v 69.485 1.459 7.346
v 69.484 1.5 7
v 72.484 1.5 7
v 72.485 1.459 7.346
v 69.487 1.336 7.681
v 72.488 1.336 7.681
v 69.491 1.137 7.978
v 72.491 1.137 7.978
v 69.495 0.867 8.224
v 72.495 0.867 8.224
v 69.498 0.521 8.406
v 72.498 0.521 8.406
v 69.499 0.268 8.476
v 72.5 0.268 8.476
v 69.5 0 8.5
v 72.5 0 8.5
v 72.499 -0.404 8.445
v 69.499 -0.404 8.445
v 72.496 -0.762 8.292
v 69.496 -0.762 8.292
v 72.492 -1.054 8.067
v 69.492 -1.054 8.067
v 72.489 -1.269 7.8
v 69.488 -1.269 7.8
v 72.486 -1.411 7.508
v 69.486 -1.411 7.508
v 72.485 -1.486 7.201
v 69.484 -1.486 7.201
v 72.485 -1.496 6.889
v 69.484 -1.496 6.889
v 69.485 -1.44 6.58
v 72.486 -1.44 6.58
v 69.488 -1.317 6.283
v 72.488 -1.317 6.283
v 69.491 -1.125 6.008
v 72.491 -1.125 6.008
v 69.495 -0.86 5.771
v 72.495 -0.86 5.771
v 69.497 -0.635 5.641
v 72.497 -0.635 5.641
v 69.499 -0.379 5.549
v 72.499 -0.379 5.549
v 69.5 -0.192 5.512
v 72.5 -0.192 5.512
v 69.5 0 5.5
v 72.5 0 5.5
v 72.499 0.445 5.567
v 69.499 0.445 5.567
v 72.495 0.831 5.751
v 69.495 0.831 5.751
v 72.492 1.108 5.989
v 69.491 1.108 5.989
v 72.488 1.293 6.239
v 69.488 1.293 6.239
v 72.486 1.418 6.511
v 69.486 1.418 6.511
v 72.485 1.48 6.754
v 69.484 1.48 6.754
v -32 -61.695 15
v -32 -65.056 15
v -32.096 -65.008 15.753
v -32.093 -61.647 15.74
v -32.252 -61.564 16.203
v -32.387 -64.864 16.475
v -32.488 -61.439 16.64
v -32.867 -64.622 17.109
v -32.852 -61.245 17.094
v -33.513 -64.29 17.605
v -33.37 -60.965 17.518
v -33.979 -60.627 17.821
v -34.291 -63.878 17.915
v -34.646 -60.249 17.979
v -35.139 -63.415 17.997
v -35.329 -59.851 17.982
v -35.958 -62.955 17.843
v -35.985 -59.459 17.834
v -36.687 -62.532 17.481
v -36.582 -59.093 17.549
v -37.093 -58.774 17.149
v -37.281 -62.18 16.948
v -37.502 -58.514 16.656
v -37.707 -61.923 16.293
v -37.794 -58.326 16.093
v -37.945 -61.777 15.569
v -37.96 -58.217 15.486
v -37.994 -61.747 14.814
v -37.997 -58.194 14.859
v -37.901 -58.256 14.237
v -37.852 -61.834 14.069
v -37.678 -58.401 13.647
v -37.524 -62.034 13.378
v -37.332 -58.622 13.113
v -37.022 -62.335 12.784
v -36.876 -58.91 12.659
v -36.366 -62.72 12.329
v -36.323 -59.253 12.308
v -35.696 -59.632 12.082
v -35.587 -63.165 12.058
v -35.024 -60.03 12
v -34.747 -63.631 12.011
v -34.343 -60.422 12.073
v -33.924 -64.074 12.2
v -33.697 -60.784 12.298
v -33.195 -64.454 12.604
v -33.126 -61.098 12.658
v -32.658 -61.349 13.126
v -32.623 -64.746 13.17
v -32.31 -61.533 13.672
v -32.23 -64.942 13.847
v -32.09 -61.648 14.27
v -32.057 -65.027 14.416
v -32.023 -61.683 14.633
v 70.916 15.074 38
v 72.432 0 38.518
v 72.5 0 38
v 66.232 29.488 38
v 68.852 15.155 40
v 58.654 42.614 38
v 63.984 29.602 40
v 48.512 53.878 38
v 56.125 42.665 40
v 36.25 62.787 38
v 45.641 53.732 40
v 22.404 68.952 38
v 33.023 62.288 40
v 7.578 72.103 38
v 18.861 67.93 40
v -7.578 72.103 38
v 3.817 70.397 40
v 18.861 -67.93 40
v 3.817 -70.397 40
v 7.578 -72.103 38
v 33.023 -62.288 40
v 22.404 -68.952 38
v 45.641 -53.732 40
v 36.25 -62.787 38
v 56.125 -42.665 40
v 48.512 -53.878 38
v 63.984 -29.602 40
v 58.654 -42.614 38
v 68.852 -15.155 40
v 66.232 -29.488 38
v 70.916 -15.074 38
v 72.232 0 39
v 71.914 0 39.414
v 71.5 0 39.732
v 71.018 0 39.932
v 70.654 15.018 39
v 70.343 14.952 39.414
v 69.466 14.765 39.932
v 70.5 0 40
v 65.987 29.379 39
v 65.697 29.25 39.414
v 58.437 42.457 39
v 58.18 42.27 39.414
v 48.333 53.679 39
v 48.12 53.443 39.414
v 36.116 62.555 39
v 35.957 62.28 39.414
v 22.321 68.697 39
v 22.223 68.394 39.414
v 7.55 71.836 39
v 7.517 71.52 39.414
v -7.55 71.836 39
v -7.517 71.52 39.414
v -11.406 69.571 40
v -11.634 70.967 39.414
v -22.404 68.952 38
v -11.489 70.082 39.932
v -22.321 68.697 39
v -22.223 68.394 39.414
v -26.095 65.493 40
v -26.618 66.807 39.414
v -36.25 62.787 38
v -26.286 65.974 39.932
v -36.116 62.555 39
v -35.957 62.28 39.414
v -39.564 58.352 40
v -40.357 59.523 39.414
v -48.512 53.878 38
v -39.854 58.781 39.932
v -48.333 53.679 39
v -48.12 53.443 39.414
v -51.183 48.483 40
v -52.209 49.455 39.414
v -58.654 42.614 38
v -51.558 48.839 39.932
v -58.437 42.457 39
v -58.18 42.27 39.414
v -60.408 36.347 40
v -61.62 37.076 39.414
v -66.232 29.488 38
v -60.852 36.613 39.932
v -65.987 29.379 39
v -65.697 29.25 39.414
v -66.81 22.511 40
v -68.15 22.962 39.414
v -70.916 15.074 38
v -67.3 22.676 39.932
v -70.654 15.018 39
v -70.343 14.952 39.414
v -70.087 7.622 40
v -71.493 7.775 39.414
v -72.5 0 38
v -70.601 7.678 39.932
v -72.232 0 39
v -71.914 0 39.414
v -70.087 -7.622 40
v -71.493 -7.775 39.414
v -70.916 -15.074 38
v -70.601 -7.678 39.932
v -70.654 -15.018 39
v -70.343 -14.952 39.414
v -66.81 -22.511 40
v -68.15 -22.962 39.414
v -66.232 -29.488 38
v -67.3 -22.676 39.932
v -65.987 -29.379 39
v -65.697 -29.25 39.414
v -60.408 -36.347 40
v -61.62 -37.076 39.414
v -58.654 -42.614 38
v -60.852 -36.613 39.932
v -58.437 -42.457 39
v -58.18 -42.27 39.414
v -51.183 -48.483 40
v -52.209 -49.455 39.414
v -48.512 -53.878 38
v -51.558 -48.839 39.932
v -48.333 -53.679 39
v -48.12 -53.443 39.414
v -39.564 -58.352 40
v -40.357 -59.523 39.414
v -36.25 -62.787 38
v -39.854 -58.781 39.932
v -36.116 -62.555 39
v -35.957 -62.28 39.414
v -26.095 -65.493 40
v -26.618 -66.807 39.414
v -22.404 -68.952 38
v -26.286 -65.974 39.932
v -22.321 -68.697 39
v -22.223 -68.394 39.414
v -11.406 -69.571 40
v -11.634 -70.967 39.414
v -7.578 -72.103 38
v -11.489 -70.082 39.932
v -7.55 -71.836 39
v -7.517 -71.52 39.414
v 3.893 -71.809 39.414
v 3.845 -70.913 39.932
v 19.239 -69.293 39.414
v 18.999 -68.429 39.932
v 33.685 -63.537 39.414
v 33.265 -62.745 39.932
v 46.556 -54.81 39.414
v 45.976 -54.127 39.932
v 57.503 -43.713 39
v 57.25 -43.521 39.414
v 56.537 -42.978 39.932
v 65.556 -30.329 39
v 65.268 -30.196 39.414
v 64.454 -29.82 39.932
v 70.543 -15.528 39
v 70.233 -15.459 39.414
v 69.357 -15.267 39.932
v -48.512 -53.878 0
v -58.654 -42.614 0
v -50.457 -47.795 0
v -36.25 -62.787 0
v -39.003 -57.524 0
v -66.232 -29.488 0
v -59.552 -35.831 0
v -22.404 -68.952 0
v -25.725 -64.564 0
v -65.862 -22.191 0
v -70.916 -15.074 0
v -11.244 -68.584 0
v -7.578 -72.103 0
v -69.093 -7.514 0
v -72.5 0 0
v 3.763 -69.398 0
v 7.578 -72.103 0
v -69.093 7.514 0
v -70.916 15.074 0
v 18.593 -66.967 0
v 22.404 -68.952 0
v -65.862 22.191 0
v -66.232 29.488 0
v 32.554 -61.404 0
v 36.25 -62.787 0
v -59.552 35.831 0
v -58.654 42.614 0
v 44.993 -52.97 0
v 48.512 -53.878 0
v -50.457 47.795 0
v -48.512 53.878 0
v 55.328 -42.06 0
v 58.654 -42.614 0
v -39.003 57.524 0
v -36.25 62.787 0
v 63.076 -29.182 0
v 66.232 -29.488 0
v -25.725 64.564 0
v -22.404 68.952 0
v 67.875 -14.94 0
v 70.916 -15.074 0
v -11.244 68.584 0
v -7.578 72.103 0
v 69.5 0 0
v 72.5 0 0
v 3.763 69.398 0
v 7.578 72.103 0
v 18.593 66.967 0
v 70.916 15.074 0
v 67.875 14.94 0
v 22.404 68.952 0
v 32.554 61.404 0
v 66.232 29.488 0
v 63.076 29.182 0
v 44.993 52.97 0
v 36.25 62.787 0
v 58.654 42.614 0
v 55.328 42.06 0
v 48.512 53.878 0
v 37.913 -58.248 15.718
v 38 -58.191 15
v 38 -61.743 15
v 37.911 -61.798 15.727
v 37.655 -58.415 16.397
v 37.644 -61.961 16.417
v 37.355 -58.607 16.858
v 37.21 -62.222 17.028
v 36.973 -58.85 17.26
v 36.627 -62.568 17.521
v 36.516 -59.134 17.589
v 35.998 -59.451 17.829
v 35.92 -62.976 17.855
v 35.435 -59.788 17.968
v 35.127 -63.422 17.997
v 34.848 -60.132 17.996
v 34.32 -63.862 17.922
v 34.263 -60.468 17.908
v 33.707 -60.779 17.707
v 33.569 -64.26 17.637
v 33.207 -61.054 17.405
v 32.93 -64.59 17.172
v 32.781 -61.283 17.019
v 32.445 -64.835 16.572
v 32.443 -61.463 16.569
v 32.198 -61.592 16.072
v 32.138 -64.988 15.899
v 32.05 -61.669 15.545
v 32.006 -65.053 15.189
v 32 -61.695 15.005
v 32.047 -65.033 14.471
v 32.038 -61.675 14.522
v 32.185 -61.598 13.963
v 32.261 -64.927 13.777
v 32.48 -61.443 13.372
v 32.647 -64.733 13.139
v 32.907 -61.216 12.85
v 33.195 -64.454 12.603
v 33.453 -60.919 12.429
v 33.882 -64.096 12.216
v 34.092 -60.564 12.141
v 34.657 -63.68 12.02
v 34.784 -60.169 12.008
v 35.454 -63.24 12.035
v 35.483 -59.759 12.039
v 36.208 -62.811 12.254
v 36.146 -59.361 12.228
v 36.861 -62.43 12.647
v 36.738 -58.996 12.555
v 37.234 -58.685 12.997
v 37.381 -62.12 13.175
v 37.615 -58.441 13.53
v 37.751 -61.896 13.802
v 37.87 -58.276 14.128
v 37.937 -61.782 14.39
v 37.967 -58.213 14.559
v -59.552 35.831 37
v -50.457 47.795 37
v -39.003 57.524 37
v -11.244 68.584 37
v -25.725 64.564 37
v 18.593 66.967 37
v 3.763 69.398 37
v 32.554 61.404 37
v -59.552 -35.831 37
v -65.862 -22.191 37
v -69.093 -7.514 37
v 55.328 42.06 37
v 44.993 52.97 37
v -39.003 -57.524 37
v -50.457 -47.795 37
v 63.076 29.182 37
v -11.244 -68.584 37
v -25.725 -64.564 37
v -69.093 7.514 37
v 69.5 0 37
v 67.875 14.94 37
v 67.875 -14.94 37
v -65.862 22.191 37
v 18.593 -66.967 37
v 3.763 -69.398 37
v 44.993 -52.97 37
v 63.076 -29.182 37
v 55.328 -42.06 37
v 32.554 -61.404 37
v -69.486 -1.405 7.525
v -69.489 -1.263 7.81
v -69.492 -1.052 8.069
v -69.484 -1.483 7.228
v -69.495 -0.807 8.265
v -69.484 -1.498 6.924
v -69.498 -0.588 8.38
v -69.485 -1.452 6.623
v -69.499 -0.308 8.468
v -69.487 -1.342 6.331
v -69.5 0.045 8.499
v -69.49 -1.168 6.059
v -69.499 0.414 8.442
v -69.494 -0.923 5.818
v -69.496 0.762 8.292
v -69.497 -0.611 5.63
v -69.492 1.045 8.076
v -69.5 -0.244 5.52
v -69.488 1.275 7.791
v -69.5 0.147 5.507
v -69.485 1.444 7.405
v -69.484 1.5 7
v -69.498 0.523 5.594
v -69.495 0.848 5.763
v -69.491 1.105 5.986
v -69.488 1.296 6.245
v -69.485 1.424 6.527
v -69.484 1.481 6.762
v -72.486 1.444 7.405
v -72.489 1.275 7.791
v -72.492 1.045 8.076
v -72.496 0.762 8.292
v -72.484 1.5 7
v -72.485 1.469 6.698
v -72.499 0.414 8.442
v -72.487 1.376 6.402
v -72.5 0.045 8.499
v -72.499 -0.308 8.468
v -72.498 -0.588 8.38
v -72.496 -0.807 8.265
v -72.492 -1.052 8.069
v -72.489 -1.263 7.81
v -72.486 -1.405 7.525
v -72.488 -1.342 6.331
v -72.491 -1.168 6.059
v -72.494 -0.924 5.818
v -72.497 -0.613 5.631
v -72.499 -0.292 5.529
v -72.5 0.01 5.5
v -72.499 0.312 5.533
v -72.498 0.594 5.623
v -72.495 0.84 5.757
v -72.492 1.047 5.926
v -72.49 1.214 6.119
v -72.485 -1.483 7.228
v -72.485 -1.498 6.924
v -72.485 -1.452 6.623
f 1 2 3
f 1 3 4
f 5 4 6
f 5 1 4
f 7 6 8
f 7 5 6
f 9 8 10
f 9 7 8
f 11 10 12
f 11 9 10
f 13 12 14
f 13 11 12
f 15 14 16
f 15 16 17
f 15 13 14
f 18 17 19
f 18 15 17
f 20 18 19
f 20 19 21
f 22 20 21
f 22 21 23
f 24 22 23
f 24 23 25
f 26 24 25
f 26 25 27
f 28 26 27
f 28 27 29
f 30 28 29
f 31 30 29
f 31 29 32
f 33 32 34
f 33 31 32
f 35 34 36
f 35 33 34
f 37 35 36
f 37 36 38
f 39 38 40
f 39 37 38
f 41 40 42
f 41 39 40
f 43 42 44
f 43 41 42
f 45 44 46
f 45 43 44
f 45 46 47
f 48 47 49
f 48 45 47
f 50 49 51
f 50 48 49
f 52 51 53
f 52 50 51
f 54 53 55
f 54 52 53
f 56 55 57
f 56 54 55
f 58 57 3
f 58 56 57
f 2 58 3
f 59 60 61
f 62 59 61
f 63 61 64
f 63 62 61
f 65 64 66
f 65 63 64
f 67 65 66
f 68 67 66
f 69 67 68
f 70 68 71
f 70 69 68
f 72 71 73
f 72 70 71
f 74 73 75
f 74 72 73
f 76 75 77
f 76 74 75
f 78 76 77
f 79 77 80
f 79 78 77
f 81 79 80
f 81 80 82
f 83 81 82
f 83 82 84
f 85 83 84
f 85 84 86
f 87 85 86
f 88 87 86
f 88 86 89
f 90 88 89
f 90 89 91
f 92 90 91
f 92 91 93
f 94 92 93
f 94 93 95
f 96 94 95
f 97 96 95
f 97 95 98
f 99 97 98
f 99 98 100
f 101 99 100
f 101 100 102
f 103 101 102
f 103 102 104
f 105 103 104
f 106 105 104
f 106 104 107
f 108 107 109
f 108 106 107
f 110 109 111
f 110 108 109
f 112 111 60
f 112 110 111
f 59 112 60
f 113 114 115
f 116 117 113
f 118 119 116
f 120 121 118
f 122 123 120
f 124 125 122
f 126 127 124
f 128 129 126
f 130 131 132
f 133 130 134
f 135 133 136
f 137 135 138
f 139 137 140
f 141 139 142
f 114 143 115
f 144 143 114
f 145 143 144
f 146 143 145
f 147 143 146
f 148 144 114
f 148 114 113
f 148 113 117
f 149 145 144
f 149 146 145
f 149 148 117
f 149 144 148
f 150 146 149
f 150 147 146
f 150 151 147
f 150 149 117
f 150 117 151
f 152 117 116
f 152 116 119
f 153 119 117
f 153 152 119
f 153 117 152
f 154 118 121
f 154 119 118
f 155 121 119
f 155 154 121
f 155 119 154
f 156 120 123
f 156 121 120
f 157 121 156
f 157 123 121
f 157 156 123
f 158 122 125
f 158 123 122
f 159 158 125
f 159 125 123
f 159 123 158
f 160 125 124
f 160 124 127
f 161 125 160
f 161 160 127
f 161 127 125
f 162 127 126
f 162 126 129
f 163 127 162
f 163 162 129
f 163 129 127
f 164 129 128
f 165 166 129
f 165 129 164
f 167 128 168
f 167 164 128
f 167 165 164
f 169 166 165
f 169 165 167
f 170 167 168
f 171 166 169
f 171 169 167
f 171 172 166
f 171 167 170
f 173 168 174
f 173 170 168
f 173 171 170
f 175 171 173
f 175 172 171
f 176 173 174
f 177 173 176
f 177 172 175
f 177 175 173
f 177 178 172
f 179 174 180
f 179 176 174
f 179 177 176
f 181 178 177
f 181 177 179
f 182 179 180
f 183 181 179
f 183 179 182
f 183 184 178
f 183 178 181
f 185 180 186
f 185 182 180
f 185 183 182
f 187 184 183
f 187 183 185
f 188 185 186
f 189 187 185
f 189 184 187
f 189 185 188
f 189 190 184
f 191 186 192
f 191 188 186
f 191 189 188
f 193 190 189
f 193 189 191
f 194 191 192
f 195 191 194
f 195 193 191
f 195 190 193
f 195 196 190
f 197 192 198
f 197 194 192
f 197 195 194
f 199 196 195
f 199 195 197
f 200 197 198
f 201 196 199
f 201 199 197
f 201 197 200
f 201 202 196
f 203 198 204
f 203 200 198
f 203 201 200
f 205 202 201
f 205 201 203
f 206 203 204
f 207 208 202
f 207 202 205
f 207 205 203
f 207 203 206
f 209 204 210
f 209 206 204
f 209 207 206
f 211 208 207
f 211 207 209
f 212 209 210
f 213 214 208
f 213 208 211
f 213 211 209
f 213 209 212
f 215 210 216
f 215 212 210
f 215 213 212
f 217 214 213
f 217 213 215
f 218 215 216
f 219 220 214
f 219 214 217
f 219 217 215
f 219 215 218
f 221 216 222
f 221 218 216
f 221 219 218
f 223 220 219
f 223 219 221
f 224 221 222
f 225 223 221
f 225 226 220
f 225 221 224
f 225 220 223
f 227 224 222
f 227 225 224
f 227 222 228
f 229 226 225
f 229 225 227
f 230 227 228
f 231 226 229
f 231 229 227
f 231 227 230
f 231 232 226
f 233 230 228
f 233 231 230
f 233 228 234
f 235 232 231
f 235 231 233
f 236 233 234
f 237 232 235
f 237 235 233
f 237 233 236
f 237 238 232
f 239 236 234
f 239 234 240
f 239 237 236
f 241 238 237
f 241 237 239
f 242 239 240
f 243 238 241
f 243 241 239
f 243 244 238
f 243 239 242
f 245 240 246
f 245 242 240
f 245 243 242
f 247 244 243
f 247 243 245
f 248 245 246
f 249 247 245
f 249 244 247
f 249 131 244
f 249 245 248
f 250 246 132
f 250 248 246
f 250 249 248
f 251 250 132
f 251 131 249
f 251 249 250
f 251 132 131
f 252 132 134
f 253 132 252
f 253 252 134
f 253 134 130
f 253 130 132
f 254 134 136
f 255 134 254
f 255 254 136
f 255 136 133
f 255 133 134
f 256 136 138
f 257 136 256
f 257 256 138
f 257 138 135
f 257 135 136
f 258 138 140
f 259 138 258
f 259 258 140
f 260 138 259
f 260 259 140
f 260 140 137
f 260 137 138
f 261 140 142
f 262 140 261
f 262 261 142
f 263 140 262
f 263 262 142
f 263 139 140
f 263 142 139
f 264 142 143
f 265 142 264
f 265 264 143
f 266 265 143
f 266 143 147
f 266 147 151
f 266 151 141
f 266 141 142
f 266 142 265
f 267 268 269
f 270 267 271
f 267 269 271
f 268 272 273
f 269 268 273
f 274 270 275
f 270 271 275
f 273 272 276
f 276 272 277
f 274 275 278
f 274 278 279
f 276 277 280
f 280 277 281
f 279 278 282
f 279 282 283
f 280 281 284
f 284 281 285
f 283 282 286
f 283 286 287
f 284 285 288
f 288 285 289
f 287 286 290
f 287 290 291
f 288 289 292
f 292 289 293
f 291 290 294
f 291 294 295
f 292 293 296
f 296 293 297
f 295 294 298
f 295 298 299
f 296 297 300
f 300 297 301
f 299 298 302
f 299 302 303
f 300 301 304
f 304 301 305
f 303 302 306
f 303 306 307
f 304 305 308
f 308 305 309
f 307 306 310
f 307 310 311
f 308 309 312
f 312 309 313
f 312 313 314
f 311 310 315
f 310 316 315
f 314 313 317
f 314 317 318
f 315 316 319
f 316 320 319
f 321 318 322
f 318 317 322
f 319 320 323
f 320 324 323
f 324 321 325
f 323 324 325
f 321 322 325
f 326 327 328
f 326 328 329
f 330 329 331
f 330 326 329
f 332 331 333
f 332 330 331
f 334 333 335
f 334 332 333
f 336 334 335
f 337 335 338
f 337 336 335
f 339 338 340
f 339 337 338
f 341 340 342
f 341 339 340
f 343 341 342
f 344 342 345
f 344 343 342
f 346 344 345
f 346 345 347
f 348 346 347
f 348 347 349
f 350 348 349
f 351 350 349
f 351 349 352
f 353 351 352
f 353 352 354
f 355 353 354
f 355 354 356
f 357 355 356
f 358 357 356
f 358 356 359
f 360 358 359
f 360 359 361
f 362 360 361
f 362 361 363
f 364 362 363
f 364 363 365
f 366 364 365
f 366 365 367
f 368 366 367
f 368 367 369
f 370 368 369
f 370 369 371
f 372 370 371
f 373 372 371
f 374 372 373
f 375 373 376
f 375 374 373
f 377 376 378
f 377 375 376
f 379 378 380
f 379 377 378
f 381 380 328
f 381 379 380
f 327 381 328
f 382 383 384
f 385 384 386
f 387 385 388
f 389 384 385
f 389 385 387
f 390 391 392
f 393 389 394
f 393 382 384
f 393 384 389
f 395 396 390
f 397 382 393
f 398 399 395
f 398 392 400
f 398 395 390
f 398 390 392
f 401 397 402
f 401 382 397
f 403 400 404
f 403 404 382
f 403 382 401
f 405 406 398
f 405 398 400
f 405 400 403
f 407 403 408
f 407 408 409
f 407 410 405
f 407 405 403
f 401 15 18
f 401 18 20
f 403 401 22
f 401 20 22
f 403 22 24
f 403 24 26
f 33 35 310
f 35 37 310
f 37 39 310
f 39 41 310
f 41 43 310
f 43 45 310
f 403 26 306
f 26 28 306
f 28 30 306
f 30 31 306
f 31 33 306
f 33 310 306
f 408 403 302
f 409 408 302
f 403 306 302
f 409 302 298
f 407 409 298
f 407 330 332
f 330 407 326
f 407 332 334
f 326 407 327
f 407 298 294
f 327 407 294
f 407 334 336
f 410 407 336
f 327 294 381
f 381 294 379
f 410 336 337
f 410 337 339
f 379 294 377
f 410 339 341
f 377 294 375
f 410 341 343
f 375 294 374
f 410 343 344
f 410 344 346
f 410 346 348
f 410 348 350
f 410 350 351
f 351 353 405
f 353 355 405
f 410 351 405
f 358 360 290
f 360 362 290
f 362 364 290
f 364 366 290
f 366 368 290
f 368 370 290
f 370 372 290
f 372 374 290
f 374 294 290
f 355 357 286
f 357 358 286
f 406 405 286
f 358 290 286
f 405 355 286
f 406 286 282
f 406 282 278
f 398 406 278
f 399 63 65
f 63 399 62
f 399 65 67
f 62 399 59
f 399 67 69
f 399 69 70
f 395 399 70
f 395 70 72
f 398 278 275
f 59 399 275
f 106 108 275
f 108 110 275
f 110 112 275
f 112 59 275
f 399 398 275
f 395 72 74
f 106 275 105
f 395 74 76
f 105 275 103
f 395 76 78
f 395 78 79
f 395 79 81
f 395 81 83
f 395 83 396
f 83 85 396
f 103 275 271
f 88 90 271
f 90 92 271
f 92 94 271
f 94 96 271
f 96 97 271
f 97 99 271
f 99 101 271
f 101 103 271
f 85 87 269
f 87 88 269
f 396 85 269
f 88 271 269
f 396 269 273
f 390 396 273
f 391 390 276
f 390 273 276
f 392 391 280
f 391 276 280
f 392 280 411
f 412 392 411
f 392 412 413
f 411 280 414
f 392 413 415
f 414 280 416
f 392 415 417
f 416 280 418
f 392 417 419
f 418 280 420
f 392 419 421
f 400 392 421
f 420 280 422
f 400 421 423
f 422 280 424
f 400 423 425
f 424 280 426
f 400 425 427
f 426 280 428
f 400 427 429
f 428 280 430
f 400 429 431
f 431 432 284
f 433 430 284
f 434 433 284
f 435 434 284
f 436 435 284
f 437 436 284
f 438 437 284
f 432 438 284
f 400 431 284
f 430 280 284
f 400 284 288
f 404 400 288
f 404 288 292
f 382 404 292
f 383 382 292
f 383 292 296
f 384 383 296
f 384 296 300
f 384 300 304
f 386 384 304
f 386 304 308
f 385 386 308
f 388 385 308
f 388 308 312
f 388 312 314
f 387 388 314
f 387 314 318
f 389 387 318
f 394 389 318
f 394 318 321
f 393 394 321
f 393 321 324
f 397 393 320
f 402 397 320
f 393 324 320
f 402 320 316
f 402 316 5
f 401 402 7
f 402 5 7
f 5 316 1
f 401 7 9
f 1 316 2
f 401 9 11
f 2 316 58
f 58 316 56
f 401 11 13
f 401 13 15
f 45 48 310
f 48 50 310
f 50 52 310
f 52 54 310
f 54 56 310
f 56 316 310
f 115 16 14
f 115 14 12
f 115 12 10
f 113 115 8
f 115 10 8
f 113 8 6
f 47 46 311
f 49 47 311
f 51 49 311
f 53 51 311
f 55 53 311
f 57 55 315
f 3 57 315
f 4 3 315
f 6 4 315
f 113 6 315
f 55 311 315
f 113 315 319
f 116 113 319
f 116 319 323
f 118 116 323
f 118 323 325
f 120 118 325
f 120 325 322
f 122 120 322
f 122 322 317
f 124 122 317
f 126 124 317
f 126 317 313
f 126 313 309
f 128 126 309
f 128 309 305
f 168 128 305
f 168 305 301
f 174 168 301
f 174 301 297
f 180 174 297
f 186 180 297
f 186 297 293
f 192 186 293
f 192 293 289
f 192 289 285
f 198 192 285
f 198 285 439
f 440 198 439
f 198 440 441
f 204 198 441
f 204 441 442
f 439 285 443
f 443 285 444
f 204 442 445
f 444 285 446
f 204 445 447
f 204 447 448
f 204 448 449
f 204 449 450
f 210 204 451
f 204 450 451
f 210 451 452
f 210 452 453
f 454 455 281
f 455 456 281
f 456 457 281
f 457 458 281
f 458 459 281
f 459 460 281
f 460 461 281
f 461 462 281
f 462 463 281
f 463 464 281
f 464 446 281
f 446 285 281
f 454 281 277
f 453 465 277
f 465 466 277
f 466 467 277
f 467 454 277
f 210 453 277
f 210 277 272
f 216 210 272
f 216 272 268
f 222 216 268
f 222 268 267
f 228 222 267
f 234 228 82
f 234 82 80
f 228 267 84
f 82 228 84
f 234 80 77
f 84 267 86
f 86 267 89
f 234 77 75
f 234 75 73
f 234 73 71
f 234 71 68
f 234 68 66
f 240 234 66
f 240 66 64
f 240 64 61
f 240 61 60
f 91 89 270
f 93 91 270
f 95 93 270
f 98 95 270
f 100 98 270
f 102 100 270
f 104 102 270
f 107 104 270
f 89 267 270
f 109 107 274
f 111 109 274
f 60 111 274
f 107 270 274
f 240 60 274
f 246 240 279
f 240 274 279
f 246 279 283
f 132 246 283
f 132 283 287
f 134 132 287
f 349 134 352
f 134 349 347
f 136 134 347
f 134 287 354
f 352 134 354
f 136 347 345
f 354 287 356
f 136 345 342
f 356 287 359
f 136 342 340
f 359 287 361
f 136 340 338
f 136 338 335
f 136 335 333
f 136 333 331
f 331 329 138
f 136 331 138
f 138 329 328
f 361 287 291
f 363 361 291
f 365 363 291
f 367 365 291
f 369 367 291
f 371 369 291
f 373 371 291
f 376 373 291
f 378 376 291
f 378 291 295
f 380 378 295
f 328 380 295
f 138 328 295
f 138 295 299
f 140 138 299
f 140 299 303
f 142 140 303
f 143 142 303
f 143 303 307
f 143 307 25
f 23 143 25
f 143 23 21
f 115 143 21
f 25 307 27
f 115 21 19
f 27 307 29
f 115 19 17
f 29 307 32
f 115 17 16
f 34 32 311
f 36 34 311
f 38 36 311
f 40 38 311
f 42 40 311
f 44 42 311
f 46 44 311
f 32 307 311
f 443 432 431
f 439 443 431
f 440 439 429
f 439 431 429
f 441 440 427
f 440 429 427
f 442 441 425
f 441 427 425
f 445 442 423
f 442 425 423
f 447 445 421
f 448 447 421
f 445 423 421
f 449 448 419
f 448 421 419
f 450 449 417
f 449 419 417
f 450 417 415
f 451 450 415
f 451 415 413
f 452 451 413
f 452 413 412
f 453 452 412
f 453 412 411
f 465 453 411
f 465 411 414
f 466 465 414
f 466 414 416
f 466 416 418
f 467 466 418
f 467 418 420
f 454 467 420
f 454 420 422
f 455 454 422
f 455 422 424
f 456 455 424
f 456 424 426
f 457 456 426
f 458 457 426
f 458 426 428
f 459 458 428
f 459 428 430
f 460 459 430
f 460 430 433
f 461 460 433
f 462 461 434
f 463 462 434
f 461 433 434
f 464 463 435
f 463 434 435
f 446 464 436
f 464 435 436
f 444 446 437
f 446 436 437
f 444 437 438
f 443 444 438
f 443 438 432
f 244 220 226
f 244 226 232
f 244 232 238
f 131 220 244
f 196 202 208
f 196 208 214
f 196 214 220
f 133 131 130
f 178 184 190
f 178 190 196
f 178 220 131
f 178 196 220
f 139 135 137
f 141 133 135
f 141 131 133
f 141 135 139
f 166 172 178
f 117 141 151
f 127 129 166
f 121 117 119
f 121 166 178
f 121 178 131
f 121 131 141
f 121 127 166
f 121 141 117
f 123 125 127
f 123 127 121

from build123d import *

# Parameters (mm, degrees)
F0_R          = 72.5
F1_DEPTH      = 40
F2_R          = 69.5
F3_DEPTH      = 37
F4_R          = 3
F5_DEPTH      = 72.501
F6_R          = 1.5
F7_DEPTH      = 72.5010001
F7_DEPTH_BACK = 72.5010001
F8_R          = 2


with BuildPart() as f1:
    # F0 (on Top) → F1 (new body)
    with BuildSketch(Plane.XY):
        Circle(F0_R)
    extrude(amount=F1_DEPTH)

    # F2 (on face) → F3 (cut)
    with BuildSketch(Plane(origin=(0, 0, 0), x_dir=(1, 0, 0), z_dir=(0, 0, -1))):
        Circle(F2_R)
    extrude(amount=-F3_DEPTH, mode=Mode.SUBTRACT)

    # F4 (on Front) → F5 (cut, through all)
    with BuildSketch(Plane.XZ):
        with Locations((35, 15)):
            Circle(F4_R)
        with Locations((-35, 15)):
            Circle(F4_R)
    extrude(amount=F5_DEPTH, mode=Mode.SUBTRACT)

    # F6 (on Right) → F7 (cut, two sides)
    with BuildSketch(Plane.YZ) as f7_sk:
        with Locations((0, 7)):
            Circle(F6_R)
    extrude(amount=-F7_DEPTH, mode=Mode.SUBTRACT)
    extrude(f7_sk.sketch, amount=F7_DEPTH_BACK, mode=Mode.SUBTRACT)

    # F8
    f8_edges = [f1.edges().sort_by_distance(p)[0] for p in [
        (-72.5, 0, 40),
    ]]
    fillet(f8_edges, radius=F8_R)


solid = f1.part
